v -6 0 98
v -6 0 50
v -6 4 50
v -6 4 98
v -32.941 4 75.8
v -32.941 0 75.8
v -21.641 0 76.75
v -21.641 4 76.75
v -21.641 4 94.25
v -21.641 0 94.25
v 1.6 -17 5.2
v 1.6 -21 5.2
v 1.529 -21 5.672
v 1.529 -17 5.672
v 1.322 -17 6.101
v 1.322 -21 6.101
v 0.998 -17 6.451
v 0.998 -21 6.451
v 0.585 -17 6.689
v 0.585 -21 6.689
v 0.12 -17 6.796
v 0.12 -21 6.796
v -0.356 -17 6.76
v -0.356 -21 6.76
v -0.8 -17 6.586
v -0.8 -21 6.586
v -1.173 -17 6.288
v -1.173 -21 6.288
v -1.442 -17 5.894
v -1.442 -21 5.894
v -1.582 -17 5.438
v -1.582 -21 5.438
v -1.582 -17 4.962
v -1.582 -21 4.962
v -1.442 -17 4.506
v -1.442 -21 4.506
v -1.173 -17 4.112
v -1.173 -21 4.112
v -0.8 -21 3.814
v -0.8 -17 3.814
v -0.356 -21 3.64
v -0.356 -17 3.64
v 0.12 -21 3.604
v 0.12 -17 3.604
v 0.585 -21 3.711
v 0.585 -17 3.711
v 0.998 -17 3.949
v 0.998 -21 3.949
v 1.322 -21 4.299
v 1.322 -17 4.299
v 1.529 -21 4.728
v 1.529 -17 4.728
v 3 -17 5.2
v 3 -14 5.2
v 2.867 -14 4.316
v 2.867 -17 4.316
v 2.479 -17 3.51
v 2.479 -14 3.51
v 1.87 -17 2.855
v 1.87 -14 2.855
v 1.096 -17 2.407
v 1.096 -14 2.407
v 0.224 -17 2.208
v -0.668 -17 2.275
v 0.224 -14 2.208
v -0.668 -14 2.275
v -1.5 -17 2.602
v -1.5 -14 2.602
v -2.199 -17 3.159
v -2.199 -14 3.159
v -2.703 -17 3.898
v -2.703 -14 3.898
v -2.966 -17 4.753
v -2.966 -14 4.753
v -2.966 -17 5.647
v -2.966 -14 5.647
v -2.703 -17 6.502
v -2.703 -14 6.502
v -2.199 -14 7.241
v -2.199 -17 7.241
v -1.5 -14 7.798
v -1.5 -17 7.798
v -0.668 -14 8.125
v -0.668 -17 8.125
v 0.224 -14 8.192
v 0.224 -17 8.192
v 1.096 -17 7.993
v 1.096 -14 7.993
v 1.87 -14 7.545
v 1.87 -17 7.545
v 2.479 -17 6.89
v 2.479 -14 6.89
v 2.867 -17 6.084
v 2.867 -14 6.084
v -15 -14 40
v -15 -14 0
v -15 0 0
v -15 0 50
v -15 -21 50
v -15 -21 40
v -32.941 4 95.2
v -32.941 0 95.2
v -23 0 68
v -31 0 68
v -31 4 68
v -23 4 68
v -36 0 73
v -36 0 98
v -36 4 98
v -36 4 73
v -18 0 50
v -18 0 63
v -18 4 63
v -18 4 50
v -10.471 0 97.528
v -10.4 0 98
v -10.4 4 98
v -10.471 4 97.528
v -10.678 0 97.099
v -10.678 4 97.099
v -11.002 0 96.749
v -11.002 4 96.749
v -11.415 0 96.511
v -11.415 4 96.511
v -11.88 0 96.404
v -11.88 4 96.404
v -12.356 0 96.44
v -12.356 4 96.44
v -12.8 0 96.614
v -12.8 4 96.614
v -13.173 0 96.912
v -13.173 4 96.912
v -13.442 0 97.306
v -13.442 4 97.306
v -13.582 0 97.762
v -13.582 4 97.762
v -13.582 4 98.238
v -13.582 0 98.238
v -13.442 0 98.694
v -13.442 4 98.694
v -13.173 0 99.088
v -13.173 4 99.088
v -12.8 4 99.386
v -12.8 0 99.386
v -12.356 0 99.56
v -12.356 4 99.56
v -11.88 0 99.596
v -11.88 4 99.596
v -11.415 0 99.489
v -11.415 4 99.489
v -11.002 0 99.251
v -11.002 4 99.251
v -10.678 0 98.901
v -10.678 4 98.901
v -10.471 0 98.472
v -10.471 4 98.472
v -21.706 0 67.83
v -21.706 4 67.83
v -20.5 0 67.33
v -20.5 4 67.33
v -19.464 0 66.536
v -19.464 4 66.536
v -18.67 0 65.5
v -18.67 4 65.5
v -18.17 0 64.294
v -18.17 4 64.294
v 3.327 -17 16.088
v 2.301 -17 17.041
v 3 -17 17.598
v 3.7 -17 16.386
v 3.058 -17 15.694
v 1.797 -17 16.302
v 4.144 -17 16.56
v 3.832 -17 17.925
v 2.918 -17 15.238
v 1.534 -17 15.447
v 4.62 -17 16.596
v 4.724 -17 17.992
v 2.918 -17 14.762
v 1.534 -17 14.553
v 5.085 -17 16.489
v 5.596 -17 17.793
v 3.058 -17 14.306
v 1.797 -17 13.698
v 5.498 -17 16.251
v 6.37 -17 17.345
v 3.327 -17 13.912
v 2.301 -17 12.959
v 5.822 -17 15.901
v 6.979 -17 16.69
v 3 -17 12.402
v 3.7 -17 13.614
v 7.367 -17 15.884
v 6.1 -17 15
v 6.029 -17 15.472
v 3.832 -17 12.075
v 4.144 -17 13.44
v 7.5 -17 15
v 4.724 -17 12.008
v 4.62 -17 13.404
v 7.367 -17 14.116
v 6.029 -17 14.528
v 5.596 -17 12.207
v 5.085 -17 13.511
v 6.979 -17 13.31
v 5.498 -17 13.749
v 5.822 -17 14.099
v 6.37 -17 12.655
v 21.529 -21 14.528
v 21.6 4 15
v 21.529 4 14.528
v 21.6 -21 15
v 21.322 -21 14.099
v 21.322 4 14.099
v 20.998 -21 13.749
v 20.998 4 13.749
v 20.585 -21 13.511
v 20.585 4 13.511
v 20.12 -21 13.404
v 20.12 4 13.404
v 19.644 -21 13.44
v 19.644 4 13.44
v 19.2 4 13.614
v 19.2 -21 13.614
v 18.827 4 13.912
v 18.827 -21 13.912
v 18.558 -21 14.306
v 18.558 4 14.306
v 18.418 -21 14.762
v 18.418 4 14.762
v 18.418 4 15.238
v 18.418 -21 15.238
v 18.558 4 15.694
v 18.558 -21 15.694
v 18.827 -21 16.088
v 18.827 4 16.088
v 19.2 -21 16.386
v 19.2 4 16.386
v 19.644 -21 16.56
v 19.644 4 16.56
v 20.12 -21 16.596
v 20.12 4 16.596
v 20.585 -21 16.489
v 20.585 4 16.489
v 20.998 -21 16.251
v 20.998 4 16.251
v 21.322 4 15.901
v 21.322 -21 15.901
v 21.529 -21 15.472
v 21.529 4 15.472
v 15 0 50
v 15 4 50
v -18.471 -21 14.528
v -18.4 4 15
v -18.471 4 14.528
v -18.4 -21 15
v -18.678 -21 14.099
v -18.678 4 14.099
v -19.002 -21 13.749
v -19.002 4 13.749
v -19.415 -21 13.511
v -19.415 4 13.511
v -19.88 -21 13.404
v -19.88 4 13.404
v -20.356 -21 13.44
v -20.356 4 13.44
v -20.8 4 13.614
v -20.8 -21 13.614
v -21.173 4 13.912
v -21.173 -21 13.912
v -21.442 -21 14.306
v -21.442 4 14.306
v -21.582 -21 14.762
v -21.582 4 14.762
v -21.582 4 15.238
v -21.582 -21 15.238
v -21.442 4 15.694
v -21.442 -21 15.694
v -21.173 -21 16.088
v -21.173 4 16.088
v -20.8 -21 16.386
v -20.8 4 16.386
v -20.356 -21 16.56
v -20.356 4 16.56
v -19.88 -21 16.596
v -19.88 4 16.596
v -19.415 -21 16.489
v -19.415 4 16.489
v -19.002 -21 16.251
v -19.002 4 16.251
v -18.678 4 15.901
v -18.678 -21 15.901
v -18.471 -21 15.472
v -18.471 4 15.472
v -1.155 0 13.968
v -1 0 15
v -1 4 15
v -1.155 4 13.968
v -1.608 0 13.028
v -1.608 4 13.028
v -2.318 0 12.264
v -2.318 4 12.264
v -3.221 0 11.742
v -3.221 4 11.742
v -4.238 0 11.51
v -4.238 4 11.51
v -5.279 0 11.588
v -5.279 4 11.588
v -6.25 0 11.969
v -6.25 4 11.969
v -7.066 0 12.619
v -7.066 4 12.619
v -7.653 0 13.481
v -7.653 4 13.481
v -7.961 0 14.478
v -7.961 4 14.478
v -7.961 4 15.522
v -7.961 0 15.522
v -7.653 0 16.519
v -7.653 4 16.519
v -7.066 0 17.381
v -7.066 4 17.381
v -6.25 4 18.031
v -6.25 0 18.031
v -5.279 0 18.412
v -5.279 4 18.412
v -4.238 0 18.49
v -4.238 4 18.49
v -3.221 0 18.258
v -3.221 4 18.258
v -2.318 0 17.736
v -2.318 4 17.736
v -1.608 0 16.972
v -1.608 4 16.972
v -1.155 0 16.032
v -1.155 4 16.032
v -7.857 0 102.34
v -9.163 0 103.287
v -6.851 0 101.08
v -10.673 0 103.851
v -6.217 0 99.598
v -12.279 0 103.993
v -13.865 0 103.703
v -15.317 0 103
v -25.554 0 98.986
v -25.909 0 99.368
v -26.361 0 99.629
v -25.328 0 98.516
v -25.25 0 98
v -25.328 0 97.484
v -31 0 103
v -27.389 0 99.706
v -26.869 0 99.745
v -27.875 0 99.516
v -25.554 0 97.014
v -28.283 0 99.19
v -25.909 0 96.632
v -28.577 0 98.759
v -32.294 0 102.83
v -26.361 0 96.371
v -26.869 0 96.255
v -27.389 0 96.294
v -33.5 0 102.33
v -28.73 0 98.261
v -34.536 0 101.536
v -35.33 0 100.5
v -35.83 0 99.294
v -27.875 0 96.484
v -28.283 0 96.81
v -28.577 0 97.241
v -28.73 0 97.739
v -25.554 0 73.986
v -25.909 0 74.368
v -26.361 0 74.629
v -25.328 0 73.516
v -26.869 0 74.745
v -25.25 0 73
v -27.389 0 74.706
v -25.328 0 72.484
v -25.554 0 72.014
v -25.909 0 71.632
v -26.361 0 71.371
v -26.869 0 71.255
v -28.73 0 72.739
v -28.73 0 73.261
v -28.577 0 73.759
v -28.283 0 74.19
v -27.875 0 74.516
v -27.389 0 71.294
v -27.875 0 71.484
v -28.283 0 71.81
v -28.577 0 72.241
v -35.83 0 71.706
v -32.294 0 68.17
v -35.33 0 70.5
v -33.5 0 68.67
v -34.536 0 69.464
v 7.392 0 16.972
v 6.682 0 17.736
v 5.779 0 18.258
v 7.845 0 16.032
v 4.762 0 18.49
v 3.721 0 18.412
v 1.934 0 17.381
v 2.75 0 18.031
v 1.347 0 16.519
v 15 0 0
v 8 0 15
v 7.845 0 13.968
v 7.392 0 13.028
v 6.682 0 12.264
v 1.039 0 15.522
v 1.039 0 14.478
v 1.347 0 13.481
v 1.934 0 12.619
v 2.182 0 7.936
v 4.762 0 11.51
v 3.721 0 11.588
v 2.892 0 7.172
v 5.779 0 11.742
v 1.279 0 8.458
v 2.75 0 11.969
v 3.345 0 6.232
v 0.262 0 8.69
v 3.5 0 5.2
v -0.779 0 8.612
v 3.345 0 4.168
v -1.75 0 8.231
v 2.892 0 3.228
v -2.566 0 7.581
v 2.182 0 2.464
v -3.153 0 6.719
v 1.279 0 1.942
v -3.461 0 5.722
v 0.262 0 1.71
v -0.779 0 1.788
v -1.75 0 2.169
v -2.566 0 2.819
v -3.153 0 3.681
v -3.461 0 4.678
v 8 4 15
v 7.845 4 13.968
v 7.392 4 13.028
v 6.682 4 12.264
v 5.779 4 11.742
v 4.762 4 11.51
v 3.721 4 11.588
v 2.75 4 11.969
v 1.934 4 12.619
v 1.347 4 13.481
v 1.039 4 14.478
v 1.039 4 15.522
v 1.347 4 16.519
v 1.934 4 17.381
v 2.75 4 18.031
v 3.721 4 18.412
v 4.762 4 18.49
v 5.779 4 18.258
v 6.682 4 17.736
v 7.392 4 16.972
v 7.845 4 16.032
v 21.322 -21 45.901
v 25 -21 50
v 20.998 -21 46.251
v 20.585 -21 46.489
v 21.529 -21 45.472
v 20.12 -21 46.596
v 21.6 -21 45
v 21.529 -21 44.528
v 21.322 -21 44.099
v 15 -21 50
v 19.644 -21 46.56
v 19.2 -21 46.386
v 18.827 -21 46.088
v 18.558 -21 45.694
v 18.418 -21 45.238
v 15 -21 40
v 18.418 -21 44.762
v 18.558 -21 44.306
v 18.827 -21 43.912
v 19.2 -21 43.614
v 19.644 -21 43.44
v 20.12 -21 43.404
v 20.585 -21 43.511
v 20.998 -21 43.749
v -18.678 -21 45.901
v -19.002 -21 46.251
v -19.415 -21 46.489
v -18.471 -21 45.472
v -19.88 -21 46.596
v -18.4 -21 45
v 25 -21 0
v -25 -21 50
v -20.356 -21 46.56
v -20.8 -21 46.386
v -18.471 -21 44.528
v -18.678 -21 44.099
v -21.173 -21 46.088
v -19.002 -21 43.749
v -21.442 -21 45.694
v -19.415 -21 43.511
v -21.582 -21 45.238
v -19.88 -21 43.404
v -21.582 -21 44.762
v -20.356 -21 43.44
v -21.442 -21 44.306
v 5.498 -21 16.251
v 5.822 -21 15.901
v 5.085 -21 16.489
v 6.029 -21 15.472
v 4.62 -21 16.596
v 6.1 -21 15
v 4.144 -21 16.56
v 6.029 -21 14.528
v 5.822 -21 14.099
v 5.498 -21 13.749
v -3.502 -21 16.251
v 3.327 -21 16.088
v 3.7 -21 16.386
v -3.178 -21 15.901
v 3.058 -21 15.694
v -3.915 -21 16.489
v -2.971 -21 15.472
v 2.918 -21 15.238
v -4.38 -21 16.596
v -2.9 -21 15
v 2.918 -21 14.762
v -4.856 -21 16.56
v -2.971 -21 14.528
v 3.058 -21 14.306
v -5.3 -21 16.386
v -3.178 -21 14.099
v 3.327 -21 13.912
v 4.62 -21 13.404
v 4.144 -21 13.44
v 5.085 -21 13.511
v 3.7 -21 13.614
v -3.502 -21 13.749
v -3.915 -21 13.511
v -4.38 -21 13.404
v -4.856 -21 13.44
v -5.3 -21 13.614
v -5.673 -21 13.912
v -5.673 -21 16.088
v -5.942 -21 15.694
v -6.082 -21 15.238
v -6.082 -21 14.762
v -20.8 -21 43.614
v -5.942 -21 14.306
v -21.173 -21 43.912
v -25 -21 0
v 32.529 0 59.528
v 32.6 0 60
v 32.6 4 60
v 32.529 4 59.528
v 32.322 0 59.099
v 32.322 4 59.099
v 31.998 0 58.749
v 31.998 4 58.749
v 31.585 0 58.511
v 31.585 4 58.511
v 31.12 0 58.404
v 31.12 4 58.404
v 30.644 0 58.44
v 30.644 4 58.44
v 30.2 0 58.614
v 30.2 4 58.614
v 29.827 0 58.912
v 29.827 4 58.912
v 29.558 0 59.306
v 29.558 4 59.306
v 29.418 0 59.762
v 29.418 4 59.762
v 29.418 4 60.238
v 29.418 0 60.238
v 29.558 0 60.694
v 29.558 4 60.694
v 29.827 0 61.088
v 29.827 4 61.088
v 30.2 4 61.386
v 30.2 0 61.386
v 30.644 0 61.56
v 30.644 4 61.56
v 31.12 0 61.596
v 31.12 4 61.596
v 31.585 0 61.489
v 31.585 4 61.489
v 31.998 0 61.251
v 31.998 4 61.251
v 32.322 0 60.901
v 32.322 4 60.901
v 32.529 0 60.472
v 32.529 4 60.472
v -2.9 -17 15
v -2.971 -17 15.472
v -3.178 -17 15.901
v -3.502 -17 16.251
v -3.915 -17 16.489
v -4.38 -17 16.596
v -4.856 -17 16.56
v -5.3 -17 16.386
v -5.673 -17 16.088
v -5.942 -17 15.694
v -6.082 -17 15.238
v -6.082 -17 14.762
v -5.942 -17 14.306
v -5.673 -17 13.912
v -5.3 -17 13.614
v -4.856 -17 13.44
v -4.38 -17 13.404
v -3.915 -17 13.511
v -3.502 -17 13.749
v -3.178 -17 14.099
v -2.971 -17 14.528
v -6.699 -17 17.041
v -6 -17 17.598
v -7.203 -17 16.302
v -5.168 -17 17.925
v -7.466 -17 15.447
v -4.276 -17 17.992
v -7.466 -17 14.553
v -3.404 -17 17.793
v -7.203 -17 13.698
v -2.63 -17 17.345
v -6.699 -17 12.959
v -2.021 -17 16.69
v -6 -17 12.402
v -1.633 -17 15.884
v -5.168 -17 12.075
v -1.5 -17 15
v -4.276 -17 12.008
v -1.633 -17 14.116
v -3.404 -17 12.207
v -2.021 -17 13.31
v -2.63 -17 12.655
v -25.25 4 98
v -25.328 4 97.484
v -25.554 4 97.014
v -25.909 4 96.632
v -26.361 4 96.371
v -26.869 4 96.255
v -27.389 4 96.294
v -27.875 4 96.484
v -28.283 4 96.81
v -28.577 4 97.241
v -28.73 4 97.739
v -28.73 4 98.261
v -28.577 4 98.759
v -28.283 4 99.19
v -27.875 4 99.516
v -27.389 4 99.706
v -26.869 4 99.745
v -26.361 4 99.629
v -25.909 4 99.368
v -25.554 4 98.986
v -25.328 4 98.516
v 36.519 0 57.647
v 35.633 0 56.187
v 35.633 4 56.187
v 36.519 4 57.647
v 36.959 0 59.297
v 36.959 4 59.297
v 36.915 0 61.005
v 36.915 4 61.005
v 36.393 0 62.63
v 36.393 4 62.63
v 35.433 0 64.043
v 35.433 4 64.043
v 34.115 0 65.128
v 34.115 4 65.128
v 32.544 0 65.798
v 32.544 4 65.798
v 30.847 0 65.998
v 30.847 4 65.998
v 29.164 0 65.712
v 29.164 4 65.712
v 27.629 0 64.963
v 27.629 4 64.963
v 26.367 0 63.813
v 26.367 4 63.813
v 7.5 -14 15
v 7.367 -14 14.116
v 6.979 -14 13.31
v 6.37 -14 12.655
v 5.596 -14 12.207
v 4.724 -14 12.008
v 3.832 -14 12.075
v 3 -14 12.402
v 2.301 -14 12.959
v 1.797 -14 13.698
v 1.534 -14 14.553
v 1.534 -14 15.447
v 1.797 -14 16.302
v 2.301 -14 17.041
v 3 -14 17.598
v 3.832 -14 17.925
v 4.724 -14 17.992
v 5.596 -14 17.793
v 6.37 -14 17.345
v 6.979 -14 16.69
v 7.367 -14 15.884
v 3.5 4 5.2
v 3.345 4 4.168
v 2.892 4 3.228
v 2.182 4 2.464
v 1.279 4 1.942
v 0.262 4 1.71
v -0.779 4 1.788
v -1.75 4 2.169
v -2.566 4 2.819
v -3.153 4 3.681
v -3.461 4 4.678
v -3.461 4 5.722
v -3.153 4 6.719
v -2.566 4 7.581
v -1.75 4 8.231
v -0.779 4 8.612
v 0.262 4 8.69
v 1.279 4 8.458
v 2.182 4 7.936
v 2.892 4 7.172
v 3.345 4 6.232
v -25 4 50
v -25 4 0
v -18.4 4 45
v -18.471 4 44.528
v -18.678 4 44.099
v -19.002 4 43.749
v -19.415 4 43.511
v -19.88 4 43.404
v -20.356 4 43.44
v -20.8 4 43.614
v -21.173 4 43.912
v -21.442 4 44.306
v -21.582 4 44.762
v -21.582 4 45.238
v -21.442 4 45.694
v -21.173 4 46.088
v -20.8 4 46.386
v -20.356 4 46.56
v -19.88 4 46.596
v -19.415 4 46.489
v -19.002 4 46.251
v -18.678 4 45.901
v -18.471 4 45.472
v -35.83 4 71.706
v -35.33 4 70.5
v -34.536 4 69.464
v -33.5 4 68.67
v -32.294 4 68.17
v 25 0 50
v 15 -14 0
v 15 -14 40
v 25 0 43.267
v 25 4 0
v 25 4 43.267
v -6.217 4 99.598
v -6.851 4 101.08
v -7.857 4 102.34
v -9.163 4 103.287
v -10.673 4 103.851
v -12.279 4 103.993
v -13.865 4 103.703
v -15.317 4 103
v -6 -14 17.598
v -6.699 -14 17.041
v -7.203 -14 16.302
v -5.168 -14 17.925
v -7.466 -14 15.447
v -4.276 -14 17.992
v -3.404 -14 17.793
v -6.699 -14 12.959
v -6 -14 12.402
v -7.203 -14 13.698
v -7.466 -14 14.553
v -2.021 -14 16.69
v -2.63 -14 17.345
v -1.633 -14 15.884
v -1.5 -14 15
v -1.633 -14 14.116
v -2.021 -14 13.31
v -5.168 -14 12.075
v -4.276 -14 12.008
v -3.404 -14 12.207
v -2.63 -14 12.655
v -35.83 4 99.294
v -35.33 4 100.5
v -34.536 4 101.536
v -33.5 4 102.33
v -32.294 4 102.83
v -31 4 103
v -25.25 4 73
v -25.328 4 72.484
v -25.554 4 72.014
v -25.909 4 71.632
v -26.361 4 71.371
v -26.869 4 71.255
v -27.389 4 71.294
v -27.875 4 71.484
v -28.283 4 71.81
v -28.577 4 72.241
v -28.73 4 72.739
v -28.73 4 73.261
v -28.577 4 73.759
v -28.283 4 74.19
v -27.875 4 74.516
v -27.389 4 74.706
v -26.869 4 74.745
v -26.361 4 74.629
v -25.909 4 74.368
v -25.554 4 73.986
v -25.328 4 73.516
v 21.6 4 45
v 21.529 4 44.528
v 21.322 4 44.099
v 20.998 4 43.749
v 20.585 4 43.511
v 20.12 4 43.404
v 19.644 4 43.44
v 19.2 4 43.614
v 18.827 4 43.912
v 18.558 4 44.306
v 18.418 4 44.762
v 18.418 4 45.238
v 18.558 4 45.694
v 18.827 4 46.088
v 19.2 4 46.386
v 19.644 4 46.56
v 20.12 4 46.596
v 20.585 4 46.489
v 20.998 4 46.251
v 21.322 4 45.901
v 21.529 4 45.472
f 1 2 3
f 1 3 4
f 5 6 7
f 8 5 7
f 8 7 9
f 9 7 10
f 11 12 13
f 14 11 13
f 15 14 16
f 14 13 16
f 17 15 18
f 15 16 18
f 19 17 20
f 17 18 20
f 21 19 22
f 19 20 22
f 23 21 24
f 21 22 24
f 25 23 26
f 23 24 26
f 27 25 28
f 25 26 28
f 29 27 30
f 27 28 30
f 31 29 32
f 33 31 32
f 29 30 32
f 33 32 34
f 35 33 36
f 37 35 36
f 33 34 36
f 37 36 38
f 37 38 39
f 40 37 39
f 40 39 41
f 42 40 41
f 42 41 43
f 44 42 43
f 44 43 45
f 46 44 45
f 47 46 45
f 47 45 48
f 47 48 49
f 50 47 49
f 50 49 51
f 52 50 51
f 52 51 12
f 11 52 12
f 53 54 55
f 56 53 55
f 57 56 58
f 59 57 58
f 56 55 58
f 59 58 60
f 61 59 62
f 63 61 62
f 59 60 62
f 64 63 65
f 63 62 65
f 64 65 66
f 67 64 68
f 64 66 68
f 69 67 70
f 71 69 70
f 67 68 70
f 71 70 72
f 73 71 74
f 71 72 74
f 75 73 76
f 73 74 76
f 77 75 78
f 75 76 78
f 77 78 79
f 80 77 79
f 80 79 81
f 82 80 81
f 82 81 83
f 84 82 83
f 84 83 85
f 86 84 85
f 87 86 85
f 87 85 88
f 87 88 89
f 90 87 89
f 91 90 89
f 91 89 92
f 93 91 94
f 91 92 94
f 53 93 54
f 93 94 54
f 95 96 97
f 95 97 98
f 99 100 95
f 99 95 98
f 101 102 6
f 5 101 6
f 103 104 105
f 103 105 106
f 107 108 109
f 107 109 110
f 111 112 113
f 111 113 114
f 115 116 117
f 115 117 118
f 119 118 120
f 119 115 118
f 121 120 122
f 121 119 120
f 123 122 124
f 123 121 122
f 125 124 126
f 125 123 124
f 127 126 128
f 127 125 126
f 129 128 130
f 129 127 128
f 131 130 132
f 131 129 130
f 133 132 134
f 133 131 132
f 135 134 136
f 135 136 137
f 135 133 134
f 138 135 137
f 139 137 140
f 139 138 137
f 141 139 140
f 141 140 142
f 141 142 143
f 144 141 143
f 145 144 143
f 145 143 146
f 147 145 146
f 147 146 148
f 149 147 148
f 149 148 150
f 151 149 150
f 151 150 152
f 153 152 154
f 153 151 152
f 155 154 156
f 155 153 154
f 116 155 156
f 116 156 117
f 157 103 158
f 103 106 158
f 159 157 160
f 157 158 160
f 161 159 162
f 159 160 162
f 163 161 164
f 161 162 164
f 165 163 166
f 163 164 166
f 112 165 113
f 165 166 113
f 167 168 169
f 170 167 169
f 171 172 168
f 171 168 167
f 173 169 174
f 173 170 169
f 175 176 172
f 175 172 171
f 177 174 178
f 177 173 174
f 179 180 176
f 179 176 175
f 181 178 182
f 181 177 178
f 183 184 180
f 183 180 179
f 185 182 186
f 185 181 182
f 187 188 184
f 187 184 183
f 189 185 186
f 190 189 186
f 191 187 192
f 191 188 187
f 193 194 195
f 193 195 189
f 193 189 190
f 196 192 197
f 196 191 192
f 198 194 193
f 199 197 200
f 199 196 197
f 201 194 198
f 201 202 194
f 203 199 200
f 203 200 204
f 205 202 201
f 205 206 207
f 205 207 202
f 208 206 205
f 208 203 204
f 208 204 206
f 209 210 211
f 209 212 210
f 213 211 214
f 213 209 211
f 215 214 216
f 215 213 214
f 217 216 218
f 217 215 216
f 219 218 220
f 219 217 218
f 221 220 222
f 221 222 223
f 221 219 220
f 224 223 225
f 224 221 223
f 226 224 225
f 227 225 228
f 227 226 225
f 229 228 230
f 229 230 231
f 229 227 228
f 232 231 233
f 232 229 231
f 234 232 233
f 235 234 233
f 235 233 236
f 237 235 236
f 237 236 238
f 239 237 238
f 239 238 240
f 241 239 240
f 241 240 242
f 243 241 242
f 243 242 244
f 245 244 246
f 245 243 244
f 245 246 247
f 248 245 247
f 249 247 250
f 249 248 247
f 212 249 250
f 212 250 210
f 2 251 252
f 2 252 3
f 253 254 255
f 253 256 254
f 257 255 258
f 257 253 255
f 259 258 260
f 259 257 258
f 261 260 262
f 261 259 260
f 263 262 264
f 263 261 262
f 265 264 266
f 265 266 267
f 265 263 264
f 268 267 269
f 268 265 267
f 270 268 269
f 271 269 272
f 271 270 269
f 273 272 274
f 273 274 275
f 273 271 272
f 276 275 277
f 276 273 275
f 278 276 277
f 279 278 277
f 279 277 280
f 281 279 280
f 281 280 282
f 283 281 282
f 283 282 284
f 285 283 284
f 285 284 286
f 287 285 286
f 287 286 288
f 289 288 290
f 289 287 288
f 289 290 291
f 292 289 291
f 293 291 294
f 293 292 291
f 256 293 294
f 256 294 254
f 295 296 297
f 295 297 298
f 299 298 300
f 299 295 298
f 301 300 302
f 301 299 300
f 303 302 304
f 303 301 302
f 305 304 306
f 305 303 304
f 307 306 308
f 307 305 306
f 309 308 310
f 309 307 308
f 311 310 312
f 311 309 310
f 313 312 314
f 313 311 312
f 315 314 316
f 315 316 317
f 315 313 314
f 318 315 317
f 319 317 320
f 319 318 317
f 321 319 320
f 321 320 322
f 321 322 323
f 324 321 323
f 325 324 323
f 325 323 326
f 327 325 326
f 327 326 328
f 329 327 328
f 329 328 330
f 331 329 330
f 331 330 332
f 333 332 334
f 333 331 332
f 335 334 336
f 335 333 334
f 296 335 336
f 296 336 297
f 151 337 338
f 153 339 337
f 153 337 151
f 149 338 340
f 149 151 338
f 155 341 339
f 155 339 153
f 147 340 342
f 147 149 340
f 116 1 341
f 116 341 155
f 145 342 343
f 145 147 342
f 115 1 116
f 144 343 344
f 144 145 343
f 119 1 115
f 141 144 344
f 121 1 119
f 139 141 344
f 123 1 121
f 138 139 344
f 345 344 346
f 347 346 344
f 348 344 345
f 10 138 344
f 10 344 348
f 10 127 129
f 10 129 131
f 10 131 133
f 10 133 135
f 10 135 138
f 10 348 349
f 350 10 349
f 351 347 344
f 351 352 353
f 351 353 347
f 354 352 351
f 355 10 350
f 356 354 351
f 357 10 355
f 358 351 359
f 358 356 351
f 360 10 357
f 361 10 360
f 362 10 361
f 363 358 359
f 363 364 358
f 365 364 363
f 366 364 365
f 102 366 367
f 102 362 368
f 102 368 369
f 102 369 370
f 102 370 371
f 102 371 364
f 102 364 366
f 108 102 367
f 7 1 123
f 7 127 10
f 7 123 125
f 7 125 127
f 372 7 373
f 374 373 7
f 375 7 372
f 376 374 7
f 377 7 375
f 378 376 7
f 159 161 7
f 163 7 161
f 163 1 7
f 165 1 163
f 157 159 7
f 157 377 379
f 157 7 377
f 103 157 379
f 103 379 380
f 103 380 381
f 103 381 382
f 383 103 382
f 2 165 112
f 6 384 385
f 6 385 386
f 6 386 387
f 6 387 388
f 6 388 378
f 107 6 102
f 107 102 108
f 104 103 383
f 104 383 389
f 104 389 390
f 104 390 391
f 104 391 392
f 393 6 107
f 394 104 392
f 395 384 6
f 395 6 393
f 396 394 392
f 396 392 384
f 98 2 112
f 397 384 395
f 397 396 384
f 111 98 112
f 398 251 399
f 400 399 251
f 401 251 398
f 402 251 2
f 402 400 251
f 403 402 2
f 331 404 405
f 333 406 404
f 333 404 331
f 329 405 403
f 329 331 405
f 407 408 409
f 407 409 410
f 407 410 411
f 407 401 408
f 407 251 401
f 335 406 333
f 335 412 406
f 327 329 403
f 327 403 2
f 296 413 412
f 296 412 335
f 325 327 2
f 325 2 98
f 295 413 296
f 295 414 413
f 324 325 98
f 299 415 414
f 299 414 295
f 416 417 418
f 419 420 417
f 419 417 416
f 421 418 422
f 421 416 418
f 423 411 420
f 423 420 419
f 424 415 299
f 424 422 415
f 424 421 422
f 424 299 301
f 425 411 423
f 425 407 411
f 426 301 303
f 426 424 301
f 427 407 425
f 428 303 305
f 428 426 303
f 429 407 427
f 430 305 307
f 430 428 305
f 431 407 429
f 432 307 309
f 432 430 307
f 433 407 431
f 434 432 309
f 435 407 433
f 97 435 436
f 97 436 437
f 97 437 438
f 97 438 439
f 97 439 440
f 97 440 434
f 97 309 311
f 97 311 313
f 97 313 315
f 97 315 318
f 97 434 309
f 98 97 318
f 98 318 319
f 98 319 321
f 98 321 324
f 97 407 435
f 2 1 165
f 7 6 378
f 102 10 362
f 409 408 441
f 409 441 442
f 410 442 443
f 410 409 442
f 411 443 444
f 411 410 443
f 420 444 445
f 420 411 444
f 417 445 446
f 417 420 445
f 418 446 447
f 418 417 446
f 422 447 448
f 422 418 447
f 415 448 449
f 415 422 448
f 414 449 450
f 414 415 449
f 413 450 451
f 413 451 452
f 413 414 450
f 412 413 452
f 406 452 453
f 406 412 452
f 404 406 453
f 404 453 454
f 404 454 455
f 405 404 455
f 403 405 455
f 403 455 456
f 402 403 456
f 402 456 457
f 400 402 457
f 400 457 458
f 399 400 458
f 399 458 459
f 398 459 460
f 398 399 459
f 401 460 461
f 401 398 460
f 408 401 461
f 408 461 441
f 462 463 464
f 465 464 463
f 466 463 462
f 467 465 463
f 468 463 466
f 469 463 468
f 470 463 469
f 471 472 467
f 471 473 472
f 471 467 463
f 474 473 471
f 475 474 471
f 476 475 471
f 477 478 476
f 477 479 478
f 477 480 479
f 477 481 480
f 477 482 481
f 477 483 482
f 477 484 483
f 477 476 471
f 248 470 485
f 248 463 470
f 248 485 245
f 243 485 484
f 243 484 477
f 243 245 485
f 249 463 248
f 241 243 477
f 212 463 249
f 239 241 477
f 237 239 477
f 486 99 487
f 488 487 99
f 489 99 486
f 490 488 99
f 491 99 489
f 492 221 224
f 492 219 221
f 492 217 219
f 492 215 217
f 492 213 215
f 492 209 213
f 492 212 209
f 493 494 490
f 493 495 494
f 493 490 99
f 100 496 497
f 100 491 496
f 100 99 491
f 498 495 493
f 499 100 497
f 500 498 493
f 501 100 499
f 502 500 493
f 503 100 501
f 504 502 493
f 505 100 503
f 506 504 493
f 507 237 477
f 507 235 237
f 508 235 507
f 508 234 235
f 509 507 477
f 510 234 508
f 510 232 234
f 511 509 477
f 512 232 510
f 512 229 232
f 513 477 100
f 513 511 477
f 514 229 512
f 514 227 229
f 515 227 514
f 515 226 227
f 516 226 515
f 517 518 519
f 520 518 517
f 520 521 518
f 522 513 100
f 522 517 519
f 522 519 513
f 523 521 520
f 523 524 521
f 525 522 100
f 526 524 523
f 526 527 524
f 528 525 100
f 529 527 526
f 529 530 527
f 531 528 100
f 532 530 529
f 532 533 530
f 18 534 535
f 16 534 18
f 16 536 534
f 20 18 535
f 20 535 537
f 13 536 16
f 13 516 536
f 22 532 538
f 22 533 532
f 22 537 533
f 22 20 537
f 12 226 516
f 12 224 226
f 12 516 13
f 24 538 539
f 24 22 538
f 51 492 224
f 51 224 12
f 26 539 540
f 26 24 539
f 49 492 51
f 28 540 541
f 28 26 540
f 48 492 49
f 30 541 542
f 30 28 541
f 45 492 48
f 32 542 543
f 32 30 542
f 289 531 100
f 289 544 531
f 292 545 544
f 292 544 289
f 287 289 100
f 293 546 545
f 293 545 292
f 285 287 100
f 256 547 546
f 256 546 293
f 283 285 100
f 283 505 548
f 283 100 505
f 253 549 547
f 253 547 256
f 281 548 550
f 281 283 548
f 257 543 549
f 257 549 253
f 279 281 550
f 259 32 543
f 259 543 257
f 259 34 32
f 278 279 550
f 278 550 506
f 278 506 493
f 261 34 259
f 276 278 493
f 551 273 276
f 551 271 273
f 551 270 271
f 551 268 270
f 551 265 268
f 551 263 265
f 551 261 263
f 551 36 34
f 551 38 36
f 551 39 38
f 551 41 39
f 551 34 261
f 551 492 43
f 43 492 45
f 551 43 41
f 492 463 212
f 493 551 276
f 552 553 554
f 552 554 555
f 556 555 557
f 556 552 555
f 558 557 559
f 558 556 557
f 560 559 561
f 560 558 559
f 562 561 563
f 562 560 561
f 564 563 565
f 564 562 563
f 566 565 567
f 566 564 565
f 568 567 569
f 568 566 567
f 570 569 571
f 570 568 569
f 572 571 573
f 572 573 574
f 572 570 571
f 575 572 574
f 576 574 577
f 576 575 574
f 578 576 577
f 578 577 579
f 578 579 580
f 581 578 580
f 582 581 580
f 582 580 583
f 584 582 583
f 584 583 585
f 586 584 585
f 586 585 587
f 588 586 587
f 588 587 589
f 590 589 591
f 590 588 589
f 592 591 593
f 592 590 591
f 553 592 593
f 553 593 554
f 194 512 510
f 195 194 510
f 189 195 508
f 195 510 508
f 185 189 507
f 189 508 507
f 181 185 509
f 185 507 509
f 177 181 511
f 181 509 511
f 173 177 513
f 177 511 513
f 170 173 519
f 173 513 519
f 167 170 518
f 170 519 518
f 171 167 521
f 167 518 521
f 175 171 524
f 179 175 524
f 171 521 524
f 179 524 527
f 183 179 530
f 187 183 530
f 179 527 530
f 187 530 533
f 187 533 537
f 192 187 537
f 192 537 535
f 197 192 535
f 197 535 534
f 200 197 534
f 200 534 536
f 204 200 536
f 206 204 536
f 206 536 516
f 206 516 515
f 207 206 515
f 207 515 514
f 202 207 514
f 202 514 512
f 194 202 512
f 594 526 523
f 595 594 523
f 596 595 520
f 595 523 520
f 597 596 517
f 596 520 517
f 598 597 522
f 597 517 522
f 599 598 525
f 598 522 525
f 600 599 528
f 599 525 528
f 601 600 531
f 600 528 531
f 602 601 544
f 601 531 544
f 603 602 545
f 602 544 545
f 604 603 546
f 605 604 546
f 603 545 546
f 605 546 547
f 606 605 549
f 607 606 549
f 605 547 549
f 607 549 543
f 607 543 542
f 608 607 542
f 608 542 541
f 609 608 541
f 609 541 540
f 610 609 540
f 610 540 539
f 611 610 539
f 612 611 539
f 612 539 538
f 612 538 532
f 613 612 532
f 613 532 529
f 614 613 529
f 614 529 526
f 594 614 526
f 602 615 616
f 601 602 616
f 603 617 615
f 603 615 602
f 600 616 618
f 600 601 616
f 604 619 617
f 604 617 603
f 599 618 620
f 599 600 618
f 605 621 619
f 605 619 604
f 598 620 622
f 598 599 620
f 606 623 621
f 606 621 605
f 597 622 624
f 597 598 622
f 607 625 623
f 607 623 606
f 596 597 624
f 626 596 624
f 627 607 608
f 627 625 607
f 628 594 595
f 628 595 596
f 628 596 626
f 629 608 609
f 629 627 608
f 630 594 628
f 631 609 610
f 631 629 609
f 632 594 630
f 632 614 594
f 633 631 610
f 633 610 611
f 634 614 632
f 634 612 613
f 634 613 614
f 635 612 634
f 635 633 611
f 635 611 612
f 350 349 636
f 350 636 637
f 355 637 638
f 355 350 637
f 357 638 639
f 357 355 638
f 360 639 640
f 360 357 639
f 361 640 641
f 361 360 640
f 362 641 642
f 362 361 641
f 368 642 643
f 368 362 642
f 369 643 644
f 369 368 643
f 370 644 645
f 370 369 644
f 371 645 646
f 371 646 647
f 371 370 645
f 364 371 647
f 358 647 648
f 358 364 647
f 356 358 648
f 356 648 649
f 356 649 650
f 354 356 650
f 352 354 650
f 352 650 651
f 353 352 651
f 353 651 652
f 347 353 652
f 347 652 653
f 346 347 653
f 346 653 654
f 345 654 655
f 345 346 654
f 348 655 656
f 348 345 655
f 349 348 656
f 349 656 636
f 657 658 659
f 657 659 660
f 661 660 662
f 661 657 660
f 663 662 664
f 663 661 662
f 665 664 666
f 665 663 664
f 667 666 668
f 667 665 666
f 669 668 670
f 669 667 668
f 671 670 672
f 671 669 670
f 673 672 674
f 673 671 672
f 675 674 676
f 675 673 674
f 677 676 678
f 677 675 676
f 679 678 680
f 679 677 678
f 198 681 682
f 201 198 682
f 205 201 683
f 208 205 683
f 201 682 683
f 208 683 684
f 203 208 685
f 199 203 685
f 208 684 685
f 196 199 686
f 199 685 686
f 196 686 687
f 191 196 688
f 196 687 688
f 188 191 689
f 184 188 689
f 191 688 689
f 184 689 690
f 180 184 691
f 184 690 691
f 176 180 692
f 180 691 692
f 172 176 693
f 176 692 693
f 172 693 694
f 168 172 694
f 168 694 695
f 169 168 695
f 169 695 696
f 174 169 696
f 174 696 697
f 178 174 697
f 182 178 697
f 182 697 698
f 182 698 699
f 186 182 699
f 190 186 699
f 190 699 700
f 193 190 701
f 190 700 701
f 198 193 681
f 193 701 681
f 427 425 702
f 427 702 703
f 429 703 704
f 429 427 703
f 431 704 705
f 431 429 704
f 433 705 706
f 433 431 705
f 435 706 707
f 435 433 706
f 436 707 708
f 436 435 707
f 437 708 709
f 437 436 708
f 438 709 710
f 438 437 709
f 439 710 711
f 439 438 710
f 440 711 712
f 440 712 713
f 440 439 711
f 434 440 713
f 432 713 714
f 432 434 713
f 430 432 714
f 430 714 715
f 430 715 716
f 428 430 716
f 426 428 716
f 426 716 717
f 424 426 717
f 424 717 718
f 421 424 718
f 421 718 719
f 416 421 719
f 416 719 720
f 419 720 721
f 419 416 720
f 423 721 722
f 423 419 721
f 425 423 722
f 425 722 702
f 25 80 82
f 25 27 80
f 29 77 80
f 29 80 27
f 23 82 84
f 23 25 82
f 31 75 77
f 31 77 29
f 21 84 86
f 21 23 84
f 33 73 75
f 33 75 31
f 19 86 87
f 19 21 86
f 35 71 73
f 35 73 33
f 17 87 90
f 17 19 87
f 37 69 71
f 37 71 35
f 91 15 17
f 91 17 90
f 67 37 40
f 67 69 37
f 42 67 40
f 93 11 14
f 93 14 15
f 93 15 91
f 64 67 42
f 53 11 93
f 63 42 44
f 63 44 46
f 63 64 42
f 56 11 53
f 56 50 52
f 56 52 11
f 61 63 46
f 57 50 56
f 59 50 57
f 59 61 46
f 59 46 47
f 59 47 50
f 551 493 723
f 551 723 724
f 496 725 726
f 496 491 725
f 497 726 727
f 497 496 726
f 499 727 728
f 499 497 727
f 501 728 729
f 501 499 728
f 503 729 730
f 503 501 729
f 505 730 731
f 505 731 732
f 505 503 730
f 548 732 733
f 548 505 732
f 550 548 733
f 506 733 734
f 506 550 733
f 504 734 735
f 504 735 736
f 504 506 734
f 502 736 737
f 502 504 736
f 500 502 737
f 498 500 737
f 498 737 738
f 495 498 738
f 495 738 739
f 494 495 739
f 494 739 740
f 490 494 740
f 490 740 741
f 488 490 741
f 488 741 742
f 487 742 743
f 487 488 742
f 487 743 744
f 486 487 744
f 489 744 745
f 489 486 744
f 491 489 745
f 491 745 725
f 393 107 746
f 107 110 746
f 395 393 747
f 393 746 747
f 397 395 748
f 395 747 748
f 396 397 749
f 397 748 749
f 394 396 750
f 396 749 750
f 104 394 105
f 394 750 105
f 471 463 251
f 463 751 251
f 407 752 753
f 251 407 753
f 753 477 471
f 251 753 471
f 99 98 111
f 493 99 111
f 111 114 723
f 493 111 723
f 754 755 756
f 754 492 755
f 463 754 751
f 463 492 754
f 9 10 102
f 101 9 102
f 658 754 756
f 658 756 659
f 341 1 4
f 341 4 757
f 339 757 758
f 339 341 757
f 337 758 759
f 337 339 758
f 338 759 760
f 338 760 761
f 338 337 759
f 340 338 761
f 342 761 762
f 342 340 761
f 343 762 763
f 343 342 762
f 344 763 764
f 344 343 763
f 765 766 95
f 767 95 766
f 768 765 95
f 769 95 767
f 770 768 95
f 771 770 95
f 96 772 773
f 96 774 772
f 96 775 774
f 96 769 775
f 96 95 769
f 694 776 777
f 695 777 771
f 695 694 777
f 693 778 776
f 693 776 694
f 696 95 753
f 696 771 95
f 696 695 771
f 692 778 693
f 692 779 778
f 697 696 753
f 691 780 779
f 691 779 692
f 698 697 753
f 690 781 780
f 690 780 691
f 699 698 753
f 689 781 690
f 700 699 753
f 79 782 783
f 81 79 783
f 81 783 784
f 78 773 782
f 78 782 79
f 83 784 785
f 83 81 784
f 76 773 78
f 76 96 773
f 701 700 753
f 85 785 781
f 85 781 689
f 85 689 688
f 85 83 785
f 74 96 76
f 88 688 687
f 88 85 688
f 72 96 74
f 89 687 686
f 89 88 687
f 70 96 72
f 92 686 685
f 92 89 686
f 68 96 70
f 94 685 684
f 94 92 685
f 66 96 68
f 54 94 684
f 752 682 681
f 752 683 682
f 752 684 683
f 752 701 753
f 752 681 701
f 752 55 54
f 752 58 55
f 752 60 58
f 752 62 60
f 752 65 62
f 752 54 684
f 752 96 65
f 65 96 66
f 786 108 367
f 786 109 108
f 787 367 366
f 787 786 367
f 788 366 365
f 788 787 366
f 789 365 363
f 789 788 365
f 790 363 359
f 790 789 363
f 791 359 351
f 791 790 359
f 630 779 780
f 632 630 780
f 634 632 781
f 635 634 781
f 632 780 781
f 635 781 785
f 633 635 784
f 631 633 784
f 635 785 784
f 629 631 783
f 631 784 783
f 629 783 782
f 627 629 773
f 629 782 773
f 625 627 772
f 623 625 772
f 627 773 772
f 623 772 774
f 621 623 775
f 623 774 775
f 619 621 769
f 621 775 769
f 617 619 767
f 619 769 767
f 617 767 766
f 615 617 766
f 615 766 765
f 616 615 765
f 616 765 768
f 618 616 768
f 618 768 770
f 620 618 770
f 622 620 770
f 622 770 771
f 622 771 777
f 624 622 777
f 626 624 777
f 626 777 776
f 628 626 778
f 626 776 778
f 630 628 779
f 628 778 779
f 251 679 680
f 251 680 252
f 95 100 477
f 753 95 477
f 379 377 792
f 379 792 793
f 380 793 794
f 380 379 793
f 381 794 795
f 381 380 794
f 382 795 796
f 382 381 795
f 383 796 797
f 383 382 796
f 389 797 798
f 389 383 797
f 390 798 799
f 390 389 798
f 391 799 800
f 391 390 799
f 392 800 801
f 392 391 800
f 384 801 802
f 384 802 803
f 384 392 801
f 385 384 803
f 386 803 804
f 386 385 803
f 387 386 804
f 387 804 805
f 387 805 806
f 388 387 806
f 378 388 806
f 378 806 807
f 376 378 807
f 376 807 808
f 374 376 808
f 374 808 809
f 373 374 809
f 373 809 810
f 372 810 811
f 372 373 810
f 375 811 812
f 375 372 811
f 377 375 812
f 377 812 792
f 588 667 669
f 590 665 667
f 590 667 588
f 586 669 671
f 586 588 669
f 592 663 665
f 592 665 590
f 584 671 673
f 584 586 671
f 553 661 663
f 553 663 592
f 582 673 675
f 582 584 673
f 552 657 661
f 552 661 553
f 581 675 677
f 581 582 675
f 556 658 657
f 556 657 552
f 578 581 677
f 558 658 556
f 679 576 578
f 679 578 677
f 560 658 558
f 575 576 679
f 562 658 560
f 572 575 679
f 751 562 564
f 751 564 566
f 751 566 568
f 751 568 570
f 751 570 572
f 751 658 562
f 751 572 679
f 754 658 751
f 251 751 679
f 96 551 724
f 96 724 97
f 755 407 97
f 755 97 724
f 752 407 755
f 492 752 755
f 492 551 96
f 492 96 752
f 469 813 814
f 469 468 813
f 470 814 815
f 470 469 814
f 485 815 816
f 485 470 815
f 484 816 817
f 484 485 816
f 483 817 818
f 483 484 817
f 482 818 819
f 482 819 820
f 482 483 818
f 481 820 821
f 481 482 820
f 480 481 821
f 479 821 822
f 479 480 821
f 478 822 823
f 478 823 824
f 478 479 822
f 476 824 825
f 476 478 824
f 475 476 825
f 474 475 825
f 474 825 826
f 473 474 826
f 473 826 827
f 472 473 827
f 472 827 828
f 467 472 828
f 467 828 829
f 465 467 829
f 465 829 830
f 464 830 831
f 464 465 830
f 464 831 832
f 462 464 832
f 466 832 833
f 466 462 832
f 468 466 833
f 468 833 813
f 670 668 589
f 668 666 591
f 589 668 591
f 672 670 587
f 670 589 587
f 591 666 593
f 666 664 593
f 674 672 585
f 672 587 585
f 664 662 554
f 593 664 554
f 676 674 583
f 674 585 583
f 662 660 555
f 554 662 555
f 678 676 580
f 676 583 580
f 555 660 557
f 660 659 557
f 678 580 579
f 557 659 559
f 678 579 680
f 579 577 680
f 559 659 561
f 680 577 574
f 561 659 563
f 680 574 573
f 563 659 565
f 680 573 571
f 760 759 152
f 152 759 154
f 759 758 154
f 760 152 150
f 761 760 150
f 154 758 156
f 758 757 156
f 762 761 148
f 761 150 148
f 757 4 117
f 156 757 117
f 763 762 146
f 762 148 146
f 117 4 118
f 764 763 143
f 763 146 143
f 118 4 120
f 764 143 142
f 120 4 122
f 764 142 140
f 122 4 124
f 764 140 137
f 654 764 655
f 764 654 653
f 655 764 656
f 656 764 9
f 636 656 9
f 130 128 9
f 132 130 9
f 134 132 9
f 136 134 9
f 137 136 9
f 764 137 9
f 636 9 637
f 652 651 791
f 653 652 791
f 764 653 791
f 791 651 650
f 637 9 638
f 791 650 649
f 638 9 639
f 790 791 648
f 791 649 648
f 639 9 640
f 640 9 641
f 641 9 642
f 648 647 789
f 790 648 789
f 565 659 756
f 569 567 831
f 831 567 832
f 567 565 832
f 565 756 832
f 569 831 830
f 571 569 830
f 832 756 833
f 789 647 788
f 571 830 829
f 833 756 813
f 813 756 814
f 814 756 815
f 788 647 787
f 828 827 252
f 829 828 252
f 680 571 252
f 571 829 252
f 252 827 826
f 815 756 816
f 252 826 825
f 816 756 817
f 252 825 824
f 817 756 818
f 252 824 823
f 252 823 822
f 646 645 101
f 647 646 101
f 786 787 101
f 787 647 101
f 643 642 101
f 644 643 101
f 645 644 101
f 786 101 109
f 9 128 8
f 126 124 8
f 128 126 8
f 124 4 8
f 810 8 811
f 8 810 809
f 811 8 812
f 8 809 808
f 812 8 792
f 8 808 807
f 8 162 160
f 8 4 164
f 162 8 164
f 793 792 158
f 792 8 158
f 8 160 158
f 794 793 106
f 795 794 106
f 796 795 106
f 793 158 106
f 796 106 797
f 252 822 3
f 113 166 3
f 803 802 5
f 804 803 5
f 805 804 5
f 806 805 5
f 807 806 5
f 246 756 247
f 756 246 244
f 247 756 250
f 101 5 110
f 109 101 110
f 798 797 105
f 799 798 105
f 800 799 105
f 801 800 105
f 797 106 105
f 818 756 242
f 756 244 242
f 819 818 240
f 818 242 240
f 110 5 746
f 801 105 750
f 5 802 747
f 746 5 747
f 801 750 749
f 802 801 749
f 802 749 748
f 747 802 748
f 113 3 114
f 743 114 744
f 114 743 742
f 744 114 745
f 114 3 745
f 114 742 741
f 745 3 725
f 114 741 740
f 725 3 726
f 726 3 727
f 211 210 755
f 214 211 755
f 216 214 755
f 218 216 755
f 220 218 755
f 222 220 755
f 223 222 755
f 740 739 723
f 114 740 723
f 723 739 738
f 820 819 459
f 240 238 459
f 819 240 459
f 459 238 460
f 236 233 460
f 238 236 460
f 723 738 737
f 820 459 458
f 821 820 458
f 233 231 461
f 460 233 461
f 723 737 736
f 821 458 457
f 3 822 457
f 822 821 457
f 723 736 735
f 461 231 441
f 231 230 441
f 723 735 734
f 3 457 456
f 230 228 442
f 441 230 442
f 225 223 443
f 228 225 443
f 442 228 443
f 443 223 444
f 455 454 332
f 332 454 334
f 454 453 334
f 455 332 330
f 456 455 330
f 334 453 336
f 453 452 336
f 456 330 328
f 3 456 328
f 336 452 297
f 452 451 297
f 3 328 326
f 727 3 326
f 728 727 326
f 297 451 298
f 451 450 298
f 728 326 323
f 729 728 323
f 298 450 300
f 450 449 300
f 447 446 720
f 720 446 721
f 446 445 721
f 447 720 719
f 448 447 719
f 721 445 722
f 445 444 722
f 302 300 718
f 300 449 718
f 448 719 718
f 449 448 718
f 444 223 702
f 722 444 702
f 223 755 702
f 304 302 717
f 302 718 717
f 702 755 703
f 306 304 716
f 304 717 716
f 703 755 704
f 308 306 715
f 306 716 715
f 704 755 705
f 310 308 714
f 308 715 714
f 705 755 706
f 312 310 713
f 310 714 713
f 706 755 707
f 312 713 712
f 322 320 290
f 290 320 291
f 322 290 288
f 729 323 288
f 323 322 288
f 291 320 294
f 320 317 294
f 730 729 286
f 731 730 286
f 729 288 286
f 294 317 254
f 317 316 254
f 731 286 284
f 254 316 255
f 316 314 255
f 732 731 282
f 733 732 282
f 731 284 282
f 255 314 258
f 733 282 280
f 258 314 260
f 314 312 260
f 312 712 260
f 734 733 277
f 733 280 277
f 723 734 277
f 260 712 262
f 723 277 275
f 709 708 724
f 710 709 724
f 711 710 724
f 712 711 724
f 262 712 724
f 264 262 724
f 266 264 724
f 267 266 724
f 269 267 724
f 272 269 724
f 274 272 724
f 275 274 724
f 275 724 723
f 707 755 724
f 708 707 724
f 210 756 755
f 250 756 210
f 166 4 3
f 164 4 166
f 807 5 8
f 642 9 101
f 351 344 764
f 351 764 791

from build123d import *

# Parameters (mm, degrees)
RESSALTO_EXTRUS_O1_DEPTH = 50
ESBO_O2_R                = 1.6
CORTE_EXTRUS_O1_DEPTH    = 40
ESBO_O3_R                = 1.6
ESBO_O3_R_2              = 1.75
ESBO_O3_R_3              = 3.5
RESSALTO_EXTRUS_O2_DEPTH = 4
ESBO_O4_W                = 30
ESBO_O4_H                = 10
CORTE_EXTRUS_O2_DEPTH    = 7
FILETE1_R                = 5
CORTE_EXTRUS_O3_START    = -18
ESBO_O5_R                = 3
CORTE_EXTRUS_O3_DEPTH    = 3


with BuildPart() as part:
    # Esboço1 → Ressalto-extrusão1 (new body)
    with BuildSketch(Plane.XY):
        Polygon((-25, 0), (-15, 0), (-15, -14), (15, -14), (15, 0), (25, 0), (25, -21), (-25, -21), align=None)
    extrude(amount=RESSALTO_EXTRUS_O1_DEPTH)

    # Esboço2 → Corte-extrusão1 (cut)
    with BuildSketch(Plane.XZ.offset(21)):
        with Locations((-20, 45)):
            Circle(ESBO_O2_R)
        with Locations((20, 45)):
            Circle(ESBO_O2_R)
        with Locations((20, 15)):
            Circle(ESBO_O2_R)
        with Locations((-20, 15)):
            Circle(ESBO_O2_R)
        with Locations((-4.5, 15)):
            Circle(ESBO_O2_R)
        with Locations((0, 5.2)):
            Circle(ESBO_O2_R)
        with Locations((4.5, 15)):
            Circle(ESBO_O2_R)
    extrude(amount=-CORTE_EXTRUS_O1_DEPTH, mode=Mode.SUBTRACT)

    # Esboço3 → Ressalto-extrusão2 (add)
    with BuildSketch(Plane(origin=(0, 0, 0), x_dir=(1, 0, 0), z_dir=(0, 1, 0))):
        with BuildLine():
            Line((25, -43.266873708), (35.632900644, -56.18735897))
            ThreePointArc((35.632900644, -56.18735897), (34.81264103, -64.632900644), (26.367099356, -63.81264103))
            Line((26.367099356, -63.81264103), (15, -50))
            Line((15, -50), (-6, -50))
            Line((-6, -50), (-6, -98))
            ThreePointArc((-6, -98), (-9.162725669, -103.286764074), (-15.31662479, -103))
            Line((-15.31662479, -103), (-36, -103))
            Line((-36, -103), (-36, -68))
            Line((-36, -68), (-18, -68))
            Line((-18, -68), (-18, -50))
            Line((-18, -50), (-25, -50))
            Line((-25, -50), (-25, 0))
            Line((-25, 0), (25, 0))
            Line((25, 0), (25, -43.266873708))
        make_face()
        with Locations((20, -45)):
            Circle(ESBO_O3_R, mode=Mode.SUBTRACT)
        with Locations((20, -15)):
            Circle(ESBO_O3_R, mode=Mode.SUBTRACT)
        with Locations((-20, -15)):
            Circle(ESBO_O3_R, mode=Mode.SUBTRACT)
        with Locations((-20, -45)):
            Circle(ESBO_O3_R, mode=Mode.SUBTRACT)
        with Locations((31, -60)):
            Circle(ESBO_O3_R, mode=Mode.SUBTRACT)
        with Locations((-12, -98)):
            Circle(ESBO_O3_R, mode=Mode.SUBTRACT)
        with Locations((-27, -98)):
            Circle(ESBO_O3_R_2, mode=Mode.SUBTRACT)
        with Locations((-27, -73)):
            Circle(ESBO_O3_R_2, mode=Mode.SUBTRACT)
        with Locations((0, -5.2)):
            Circle(ESBO_O3_R_3, mode=Mode.SUBTRACT)
        with Locations((-4.5, -15)):
            Circle(ESBO_O3_R_3, mode=Mode.SUBTRACT)
        with Locations((4.5, -15)):
            Circle(ESBO_O3_R_3, mode=Mode.SUBTRACT)
        Polygon((-32.940921409, -75.8), (-21.640921409, -76.75), (-21.640921409, -94.25), (-32.940921409, -95.2), align=None, mode=Mode.SUBTRACT)
    extrude(amount=RESSALTO_EXTRUS_O2_DEPTH)

    # Esboço4 → Corte-extrusão2 (cut)
    with BuildSketch(Plane.XZ.offset(21)):
        with Locations((0, 45)):
            Rectangle(ESBO_O4_W, ESBO_O4_H)
    extrude(amount=-CORTE_EXTRUS_O2_DEPTH, mode=Mode.SUBTRACT)

    # Filete1
    filete1_edges = [part.edges().sort_by_distance(p)[0] for p in [
        (-18, 2, 68),
        (-36, 2, 68),
        (-36, 2, 103),
    ]]
    fillet(filete1_edges, radius=FILETE1_R)

    # Esboço5 → Corte-extrusão3 (cut)
    with BuildSketch(Plane(origin=(0, 4, 0), x_dir=(1, 0, 0), z_dir=(0, 1, 0)).offset(CORTE_EXTRUS_O3_START)):
        with Locations((4.5, -15)):
            Circle(ESBO_O5_R)
        with Locations((-4.5, -15)):
            Circle(ESBO_O5_R)
        with Locations((0, -5.2)):
            Circle(ESBO_O5_R)
    extrude(amount=-CORTE_EXTRUS_O3_DEPTH, mode=Mode.SUBTRACT)


solid = part.part
